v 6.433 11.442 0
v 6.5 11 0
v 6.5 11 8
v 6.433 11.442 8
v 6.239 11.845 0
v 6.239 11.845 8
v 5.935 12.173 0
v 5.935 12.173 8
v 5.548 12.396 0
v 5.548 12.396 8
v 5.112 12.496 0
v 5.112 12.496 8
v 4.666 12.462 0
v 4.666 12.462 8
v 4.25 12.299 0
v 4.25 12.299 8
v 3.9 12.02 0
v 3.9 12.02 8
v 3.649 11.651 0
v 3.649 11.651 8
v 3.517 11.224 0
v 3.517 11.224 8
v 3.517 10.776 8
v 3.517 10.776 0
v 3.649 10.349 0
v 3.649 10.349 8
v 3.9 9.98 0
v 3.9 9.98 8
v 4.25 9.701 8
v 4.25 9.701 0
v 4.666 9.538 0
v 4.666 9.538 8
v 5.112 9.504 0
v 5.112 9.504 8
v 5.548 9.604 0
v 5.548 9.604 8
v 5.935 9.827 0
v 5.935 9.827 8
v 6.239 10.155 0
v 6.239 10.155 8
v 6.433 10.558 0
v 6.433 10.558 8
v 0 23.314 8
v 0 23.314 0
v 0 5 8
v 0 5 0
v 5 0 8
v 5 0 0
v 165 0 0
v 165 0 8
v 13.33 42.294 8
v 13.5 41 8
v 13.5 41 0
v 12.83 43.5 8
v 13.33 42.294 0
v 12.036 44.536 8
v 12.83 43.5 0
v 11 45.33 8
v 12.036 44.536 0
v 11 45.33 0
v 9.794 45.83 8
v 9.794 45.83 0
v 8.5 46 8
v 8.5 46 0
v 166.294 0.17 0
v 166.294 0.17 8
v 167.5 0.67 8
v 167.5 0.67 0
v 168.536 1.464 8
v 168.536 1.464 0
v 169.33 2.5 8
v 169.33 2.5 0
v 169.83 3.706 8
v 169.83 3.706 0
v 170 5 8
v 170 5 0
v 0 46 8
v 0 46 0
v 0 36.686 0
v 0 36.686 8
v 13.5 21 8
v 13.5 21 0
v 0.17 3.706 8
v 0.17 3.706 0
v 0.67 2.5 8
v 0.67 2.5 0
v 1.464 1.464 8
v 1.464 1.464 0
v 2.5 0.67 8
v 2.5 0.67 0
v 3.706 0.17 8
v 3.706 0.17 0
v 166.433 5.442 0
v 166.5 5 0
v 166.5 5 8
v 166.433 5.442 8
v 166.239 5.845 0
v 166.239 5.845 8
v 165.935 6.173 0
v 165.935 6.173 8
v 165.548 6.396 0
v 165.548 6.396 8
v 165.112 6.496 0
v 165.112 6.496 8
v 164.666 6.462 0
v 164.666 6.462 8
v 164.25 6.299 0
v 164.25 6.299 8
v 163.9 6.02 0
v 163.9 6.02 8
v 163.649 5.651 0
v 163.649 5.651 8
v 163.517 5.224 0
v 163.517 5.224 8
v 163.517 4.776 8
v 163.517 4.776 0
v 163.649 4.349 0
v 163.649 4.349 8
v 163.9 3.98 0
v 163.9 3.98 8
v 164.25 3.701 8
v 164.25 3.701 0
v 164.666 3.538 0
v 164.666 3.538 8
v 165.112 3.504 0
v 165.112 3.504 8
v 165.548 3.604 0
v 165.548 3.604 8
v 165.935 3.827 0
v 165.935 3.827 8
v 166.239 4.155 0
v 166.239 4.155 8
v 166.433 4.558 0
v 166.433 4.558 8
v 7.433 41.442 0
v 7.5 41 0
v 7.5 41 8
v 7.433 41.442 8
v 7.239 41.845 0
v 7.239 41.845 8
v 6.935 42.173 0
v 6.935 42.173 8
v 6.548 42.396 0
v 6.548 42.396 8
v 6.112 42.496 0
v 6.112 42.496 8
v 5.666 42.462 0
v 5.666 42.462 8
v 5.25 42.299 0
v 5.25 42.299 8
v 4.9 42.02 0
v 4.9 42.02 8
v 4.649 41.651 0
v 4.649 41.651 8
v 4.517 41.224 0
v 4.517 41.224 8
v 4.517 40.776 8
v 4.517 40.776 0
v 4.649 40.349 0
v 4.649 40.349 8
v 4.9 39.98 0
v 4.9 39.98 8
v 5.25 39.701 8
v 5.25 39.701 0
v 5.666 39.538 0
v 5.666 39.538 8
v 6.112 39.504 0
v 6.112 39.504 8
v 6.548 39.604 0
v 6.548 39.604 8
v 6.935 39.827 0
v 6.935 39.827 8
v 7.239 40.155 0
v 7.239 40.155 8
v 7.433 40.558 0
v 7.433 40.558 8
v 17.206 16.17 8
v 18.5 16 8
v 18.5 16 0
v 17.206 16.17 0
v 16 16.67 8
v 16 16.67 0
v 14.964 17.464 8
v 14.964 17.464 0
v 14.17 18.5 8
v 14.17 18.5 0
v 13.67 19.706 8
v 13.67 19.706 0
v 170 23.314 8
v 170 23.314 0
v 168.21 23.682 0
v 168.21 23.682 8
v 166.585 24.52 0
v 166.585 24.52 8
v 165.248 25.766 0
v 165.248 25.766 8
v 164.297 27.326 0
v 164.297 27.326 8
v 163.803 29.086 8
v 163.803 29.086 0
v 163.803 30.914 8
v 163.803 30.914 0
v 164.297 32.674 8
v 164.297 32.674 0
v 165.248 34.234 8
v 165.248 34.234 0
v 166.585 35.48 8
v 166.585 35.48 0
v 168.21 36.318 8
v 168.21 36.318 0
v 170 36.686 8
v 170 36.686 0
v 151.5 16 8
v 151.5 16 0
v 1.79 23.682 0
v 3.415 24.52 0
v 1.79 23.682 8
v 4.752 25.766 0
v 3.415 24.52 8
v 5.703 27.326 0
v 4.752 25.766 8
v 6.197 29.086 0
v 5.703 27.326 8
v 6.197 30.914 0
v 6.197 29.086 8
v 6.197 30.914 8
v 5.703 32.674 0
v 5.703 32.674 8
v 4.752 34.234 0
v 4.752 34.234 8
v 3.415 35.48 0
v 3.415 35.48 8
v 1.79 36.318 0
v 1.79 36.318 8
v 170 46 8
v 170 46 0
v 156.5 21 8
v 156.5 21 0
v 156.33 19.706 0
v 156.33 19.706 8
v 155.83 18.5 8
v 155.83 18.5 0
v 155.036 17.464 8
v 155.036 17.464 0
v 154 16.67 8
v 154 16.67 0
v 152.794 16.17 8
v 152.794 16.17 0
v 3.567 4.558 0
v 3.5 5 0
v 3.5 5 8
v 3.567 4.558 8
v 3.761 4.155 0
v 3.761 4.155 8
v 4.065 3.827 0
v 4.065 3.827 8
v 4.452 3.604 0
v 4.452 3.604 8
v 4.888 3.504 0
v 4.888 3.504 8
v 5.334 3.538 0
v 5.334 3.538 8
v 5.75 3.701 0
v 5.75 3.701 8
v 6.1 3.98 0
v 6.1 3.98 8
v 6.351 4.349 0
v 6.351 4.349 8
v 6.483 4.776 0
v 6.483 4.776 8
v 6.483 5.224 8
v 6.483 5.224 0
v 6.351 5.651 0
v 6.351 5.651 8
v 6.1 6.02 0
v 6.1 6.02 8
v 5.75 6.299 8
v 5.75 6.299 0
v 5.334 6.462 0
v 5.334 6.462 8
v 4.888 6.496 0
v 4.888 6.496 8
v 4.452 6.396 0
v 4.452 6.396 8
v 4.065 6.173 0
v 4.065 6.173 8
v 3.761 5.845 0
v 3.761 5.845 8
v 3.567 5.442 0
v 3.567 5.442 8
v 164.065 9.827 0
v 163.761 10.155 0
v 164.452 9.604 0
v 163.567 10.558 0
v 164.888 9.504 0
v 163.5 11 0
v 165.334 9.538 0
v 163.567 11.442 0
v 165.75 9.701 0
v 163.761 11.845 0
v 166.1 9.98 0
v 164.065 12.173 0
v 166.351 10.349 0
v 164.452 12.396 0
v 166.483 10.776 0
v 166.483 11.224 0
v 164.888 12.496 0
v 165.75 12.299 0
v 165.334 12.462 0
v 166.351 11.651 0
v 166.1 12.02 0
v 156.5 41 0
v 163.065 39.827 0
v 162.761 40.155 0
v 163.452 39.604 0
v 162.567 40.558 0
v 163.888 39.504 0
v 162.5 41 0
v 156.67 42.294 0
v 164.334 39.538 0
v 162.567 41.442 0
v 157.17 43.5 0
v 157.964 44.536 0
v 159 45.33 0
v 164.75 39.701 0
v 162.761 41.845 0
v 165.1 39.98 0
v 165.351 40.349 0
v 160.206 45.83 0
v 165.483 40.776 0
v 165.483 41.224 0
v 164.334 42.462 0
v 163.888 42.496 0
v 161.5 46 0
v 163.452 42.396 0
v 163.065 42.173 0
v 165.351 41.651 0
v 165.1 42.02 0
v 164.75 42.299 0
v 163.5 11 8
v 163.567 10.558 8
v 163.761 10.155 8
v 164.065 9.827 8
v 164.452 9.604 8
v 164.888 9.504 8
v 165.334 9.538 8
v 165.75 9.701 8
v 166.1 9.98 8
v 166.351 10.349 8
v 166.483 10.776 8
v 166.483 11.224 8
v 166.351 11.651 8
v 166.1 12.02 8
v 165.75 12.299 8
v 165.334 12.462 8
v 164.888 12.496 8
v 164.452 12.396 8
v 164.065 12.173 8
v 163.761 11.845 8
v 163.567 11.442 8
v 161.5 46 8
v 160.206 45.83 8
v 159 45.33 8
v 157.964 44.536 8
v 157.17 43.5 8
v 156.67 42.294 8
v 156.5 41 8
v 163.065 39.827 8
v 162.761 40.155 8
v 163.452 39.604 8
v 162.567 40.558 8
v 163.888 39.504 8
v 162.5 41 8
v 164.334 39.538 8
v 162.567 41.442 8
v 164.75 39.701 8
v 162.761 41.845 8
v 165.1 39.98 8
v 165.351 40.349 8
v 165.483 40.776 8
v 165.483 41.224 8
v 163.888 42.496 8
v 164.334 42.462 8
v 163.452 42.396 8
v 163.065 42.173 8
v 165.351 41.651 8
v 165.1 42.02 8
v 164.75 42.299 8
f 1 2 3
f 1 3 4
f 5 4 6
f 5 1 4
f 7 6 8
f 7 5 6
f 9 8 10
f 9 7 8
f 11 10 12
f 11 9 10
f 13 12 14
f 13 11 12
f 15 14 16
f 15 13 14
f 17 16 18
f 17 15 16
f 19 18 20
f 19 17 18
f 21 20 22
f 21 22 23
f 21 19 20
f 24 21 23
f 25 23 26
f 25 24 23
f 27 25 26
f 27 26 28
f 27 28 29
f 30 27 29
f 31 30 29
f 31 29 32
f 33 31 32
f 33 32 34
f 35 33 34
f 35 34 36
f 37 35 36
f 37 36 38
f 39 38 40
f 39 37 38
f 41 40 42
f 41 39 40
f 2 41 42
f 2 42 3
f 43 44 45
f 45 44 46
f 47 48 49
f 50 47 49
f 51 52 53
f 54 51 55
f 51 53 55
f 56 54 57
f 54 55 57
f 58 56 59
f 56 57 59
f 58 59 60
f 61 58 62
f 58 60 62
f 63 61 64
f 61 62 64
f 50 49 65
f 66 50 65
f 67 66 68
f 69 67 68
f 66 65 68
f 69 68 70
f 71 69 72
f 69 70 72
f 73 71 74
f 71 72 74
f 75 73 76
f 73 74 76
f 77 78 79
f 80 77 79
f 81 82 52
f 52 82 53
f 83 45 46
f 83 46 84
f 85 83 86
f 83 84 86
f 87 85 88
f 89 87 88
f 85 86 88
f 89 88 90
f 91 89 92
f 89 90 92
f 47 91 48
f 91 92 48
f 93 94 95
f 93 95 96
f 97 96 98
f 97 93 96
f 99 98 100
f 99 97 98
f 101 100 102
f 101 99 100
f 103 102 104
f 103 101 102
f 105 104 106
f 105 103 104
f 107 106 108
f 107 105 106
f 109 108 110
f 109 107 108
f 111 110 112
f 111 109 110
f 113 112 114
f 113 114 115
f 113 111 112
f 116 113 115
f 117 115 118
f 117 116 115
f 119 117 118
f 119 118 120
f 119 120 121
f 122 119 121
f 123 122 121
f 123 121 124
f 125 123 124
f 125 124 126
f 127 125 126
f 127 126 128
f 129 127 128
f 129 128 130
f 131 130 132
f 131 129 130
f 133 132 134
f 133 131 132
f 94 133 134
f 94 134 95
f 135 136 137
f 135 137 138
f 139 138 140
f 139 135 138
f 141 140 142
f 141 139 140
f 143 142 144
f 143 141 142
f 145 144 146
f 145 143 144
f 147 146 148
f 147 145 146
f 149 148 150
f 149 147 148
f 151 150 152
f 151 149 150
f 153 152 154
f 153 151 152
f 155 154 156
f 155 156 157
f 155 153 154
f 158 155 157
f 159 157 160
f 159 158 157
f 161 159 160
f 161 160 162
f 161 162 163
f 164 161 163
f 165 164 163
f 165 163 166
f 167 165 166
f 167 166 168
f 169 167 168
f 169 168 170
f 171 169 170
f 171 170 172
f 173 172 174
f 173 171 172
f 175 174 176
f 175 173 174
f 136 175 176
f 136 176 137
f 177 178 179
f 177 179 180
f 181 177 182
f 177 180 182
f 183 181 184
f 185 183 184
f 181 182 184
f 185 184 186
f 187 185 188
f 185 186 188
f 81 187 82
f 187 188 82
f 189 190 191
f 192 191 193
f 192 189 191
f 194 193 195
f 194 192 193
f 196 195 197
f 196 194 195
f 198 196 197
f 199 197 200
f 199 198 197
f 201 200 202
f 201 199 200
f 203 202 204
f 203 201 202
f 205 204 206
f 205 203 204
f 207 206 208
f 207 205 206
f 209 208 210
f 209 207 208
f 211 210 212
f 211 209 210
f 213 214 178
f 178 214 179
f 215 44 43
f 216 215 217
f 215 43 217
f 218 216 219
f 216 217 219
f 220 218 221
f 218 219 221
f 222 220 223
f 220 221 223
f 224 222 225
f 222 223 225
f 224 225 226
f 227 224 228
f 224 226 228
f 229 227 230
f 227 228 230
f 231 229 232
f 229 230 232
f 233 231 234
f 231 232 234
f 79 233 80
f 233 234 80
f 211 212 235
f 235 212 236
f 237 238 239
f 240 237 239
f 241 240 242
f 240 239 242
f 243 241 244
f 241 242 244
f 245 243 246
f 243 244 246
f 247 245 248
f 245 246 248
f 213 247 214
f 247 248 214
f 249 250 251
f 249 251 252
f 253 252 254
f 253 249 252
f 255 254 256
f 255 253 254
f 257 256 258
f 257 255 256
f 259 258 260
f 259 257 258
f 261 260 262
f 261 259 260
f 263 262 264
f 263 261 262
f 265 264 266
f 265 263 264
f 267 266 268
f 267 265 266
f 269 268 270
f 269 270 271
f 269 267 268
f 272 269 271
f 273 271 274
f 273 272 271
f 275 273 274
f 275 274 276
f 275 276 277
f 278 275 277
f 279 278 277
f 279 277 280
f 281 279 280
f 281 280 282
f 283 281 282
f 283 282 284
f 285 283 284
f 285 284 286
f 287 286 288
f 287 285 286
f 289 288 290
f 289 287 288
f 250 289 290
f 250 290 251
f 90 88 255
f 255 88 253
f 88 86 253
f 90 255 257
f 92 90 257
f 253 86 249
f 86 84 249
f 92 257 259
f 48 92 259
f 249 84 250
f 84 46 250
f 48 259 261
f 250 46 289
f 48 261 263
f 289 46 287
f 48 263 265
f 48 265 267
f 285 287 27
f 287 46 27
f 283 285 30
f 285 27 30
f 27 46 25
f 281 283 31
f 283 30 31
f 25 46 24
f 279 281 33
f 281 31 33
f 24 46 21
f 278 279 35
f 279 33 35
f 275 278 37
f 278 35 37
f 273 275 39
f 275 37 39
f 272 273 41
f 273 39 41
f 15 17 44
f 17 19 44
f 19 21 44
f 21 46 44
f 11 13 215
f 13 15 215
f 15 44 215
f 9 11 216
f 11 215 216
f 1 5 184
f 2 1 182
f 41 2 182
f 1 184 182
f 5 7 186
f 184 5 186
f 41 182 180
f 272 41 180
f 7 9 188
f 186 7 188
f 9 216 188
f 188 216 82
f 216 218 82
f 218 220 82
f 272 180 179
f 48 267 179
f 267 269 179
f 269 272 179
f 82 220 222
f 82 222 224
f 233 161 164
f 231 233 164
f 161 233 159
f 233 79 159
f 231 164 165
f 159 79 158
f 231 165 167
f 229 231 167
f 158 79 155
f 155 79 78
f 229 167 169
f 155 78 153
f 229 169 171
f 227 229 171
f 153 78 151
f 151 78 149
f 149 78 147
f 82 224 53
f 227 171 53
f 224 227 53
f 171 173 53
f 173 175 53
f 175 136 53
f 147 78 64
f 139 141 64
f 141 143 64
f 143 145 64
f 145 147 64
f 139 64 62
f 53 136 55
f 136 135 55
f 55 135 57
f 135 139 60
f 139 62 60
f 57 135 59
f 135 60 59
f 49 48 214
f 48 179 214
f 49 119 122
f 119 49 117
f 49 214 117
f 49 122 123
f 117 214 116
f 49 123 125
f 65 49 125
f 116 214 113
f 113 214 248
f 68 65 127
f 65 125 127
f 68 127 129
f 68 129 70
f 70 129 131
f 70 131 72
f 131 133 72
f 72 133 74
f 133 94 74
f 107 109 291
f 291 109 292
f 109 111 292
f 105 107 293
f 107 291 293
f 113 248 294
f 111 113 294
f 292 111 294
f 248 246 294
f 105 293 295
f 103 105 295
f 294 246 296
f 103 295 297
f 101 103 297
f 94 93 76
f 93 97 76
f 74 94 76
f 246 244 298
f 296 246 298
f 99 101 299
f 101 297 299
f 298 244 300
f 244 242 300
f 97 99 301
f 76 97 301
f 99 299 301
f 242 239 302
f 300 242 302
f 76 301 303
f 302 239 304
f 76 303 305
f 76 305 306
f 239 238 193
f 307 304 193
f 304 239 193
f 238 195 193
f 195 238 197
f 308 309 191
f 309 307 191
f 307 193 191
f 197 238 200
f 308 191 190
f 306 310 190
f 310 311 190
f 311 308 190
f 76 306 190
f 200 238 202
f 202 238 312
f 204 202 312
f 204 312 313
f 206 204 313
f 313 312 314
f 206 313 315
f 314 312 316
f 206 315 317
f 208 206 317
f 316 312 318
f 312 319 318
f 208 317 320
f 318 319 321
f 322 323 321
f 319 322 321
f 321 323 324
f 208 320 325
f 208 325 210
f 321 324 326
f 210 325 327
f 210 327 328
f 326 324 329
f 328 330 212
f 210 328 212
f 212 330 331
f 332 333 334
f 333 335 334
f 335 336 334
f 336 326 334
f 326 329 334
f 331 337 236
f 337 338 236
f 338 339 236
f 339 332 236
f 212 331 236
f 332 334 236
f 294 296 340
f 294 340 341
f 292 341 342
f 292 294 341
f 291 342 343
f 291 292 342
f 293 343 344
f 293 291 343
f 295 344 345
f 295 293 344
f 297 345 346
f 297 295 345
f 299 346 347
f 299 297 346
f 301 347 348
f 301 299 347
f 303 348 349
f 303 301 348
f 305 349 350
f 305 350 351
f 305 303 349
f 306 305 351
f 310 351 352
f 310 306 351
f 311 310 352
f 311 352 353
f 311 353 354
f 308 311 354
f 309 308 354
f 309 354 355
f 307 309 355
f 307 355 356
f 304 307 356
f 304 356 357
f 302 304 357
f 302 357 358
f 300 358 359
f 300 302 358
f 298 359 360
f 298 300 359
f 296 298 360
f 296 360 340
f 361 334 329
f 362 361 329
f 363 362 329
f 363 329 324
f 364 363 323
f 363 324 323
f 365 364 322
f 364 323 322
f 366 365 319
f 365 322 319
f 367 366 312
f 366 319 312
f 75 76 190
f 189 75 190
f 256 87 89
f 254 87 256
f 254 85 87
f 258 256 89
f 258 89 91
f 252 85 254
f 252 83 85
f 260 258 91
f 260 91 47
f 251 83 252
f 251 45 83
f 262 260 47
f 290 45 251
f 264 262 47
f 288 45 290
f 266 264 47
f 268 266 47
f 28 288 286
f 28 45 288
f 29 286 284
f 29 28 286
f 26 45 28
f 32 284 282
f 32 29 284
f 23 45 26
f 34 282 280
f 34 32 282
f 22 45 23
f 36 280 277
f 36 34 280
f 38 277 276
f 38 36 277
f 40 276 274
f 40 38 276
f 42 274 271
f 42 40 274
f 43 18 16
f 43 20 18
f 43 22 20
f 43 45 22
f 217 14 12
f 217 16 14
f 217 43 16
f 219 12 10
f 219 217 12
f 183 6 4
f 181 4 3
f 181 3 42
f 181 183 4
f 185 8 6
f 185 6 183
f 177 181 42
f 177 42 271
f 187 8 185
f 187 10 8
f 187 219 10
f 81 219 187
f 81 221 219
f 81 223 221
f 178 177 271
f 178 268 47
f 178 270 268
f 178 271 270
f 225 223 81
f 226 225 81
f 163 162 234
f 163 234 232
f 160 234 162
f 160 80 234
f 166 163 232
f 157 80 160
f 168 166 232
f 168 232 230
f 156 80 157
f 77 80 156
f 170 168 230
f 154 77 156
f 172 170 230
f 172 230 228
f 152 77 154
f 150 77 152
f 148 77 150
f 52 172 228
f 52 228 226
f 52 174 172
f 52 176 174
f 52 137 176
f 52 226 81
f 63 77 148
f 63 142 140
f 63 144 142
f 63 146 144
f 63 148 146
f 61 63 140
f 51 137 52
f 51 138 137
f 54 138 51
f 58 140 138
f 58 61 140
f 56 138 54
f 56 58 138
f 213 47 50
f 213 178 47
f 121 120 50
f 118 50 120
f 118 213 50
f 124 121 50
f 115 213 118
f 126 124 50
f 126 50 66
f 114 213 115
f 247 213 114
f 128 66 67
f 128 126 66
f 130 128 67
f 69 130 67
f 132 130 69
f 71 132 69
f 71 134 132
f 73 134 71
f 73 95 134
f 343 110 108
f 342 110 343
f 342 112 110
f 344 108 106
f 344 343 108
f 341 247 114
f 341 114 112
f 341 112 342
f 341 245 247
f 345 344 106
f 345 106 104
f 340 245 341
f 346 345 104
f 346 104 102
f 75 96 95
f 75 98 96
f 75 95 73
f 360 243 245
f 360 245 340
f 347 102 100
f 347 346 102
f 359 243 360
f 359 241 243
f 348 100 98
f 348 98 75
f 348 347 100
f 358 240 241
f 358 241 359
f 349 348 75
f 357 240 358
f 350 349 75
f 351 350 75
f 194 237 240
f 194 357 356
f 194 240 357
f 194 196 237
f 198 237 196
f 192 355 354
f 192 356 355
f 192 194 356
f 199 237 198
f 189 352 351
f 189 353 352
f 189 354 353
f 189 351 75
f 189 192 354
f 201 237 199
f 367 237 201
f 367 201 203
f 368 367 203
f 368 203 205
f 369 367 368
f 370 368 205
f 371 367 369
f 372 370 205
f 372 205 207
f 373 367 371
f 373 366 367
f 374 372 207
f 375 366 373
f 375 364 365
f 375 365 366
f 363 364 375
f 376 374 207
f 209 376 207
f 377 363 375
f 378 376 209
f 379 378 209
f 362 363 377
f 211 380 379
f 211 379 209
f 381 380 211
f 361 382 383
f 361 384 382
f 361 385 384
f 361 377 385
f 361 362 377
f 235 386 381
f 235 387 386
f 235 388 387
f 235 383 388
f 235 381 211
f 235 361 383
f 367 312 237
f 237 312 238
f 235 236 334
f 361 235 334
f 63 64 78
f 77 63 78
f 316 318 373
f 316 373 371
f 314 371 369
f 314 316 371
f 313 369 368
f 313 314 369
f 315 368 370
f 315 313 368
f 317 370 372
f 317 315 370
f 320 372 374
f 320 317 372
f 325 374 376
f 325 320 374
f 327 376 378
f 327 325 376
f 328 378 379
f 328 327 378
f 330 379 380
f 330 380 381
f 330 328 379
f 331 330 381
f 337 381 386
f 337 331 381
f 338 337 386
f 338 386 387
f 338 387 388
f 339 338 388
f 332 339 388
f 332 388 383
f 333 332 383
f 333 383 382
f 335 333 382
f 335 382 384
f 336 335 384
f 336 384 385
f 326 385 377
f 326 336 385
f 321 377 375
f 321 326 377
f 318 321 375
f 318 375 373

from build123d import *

# Parameters (mm, degrees)
SKETCH_1_R          = 1.5
EXTRUDE_1_DEPTH     = 8
CUT_EXTRUDE_1_DEPTH = 177.295206968


with BuildPart() as part:
    # 草图1 → 凸台-拉伸1 (new body)
    with BuildSketch(Plane.XY):
        with BuildLine():
            Line((5, 0), (165, 0))
            ThreePointArc((165, 0), (168.535533906, 1.464466094), (170, 5))
            Line((170, 5), (170, 11))
            Line((170, 11), (170, 16))
            Line((170, 16), (170, 46))
            Line((170, 46), (161.5, 46))
            ThreePointArc((161.5, 46), (157.964466094, 44.535533906), (156.5, 41))
            Line((156.5, 41), (156.5, 21))
            ThreePointArc((156.5, 21), (155.035533906, 17.464466094), (151.5, 16))
            Line((151.5, 16), (18.5, 16))
            ThreePointArc((18.5, 16), (14.964466094, 17.464466094), (13.5, 21))
            Line((13.5, 21), (13.5, 41))
            ThreePointArc((13.5, 41), (12.035533906, 44.535533906), (8.5, 46))
            Line((8.5, 46), (0, 46))
            Line((0, 46), (0, 16))
            Line((0, 16), (0, 11))
            Line((0, 11), (0, 5))
            ThreePointArc((0, 5), (1.464466094, 1.464466094), (5, 0))
        make_face()
        with Locations((5, 11)):
            Circle(SKETCH_1_R, mode=Mode.SUBTRACT)
        with Locations(Location((5, 5, 0), (0, 0, 180))):
            Circle(SKETCH_1_R, mode=Mode.SUBTRACT)
        with Locations((165, 5)):
            Circle(SKETCH_1_R, mode=Mode.SUBTRACT)
        with Locations(Location((165, 11, 0), (0, 0, 180))):
            Circle(SKETCH_1_R, mode=Mode.SUBTRACT)
        with Locations((6, 41)):
            Circle(SKETCH_1_R, mode=Mode.SUBTRACT)
        with Locations(Location((164, 41, 0), (0, 0, 180))):
            Circle(SKETCH_1_R, mode=Mode.SUBTRACT)
    extrude(amount=EXTRUDE_1_DEPTH)

    # 草图2 → 切除-拉伸1 (cut, through all)
    with BuildSketch(Plane.XY.offset(8)):
        with BuildLine():
            Line((-0.44, 36.7), (-0.44, 23.3))
            ThreePointArc((-0.44, 23.3), (6.26, 30), (-0.44, 36.7))
        make_face()
        with BuildLine():
            Line((170.44, 36.7), (170.44, 23.3))
            ThreePointArc((170.44, 23.3), (163.74, 30), (170.44, 36.7))
        make_face()
    extrude(amount=-CUT_EXTRUDE_1_DEPTH, mode=Mode.SUBTRACT)


solid = part.part
